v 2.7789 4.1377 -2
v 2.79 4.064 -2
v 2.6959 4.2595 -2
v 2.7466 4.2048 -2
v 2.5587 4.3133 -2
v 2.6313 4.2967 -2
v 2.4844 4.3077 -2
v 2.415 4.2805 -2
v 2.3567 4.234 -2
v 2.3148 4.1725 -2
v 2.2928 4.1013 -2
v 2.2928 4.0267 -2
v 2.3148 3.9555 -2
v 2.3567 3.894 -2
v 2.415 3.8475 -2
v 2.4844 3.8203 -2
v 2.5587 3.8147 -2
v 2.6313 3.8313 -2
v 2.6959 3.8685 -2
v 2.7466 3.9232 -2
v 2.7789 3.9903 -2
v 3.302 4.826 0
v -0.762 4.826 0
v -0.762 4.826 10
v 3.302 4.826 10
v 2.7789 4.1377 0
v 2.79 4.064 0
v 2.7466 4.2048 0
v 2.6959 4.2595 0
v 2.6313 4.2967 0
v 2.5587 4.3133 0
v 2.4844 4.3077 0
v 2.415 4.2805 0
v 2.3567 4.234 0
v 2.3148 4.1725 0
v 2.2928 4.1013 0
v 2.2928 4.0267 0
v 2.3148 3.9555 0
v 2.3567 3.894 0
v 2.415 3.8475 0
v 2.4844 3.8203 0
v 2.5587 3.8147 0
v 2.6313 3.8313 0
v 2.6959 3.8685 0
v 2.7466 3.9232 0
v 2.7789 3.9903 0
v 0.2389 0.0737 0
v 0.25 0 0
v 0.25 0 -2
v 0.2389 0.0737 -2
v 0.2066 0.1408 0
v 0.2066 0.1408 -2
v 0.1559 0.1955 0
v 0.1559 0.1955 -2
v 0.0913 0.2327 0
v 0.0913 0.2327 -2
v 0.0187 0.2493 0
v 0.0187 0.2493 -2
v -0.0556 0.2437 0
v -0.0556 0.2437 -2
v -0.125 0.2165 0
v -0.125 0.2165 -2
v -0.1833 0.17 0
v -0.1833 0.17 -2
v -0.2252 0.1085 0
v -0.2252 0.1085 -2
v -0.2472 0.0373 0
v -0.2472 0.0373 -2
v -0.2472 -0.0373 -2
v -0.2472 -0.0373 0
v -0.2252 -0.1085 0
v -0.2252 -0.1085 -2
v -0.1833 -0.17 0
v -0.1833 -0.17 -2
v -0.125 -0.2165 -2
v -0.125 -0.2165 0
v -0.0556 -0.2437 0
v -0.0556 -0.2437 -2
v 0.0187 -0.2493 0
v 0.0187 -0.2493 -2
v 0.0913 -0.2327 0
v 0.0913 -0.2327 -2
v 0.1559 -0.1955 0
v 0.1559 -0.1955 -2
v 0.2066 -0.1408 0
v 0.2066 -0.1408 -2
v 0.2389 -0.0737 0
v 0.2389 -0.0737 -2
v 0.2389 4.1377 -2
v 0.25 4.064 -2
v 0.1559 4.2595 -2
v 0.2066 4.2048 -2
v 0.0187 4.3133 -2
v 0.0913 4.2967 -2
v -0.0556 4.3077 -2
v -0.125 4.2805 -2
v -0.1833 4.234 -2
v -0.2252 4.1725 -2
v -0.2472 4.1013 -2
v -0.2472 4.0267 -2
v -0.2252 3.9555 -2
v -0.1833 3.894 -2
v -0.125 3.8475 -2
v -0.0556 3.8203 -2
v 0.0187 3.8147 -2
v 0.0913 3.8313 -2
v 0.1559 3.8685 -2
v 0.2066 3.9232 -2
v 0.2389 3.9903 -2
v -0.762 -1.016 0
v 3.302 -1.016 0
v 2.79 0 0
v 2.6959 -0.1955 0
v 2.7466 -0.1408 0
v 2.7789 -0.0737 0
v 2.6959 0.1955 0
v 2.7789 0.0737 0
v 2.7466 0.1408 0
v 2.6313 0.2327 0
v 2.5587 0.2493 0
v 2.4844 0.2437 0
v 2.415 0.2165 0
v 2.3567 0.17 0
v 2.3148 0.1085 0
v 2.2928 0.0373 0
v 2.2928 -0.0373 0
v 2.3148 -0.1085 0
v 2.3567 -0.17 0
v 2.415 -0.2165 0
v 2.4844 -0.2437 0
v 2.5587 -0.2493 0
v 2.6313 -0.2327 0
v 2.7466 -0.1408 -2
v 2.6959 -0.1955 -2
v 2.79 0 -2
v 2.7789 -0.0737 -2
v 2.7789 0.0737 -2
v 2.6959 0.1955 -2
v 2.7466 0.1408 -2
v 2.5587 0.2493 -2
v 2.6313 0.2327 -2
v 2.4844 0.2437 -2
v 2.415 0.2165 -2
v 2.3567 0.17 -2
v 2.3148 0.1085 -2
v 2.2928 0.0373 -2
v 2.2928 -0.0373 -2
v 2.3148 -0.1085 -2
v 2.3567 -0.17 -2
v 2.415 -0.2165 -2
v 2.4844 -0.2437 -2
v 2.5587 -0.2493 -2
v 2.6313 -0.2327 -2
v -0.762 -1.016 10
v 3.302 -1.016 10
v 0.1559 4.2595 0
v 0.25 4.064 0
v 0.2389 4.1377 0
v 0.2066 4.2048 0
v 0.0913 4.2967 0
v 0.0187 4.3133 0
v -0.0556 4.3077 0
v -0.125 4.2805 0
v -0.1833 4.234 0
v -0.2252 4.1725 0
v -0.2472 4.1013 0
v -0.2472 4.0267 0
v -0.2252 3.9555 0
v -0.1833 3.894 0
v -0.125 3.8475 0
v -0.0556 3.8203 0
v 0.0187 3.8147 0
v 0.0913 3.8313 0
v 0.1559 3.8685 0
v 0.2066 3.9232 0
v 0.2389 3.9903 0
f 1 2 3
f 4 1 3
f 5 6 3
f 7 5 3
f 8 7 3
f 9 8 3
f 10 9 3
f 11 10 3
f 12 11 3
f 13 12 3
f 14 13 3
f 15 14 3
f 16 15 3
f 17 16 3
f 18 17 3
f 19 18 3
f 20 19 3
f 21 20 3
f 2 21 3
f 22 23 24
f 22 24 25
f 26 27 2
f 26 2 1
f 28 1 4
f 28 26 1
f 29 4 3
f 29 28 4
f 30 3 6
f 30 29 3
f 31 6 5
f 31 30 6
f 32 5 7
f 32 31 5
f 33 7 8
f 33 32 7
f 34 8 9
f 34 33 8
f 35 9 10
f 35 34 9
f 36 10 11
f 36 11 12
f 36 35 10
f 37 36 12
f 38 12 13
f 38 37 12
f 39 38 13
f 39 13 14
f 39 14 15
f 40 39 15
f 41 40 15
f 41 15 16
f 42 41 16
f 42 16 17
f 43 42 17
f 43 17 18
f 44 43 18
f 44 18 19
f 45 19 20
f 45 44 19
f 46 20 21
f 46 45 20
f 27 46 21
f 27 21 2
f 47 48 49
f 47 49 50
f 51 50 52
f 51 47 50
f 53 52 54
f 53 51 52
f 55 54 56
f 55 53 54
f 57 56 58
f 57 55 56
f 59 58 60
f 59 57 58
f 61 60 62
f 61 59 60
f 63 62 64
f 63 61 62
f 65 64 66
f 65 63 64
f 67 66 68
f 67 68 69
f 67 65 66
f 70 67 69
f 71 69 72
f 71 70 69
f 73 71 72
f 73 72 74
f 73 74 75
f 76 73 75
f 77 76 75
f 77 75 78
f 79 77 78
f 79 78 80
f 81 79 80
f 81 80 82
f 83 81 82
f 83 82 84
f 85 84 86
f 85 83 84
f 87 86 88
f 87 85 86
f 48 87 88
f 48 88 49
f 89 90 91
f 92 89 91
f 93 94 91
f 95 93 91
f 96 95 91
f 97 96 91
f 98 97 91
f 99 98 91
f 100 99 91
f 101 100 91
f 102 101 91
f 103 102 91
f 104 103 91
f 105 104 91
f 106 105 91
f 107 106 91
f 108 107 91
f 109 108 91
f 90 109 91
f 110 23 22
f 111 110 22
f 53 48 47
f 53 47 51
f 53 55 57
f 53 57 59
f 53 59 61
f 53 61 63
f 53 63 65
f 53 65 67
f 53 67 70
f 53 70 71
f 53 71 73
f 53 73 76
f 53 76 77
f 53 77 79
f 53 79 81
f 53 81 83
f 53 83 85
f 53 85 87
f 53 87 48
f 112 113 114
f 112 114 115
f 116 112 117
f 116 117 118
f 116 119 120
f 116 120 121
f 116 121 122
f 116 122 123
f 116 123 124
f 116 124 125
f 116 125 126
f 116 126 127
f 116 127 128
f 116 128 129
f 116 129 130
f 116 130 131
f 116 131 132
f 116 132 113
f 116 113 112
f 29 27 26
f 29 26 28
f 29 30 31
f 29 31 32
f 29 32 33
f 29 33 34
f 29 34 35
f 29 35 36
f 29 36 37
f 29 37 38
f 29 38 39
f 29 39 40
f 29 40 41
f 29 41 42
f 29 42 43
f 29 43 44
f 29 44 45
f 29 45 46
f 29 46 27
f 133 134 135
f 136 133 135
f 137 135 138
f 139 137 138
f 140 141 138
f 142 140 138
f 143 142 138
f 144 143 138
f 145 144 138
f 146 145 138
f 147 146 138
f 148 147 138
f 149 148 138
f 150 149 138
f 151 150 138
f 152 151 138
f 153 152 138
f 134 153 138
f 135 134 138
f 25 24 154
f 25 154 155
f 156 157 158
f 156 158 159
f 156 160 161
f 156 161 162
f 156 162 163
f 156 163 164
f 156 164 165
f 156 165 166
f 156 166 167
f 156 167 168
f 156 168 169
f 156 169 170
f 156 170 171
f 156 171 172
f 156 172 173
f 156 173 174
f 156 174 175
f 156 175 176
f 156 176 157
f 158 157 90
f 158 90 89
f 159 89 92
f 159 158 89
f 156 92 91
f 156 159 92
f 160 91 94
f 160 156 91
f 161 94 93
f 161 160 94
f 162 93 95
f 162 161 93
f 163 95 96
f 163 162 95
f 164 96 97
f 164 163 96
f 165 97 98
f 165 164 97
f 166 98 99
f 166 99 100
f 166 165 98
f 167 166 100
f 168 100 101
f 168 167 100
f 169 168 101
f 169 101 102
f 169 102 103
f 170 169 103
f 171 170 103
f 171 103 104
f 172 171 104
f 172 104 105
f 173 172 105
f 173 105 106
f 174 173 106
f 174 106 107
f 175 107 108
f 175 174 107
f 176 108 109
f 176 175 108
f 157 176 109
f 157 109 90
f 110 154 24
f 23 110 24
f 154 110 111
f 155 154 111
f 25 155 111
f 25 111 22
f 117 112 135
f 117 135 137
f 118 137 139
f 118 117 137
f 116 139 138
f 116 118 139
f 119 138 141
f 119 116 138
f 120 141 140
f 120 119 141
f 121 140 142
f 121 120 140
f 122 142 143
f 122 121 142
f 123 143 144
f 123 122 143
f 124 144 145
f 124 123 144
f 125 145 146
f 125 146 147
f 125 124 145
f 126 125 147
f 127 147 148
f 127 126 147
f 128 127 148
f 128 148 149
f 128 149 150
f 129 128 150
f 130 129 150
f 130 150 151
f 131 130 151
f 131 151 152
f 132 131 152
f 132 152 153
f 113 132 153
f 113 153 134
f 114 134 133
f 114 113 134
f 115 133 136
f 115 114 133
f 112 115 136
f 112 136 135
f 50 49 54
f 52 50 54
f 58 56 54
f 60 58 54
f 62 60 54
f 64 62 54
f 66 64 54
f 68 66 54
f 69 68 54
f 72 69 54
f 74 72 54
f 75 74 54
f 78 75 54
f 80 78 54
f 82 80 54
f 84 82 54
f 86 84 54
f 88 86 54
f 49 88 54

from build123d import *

# Parameters (mm, degrees)
SKETCH1_W               = 4.064
SKETCH1_H               = 5.842
COMPONENT_OUTLINE_DEPTH = 10
SKETCH2_R               = 0.25
EXTRUDE_1_DEPTH         = 2
SKETCH3_R               = 0.25
EXTRUDE_2_DEPTH         = 2
SKETCH4_R               = 0.25
EXTRUDE_3_DEPTH         = 2
SKETCH5_R               = 0.25
EXTRUDE_4_DEPTH         = 2


with BuildPart() as part:
    # Sketch1 → Component_Outline (new body)
    with BuildSketch(Plane.XY):
        with Locations((1.27, 1.905)):
            Rectangle(SKETCH1_W, SKETCH1_H)
    extrude(amount=COMPONENT_OUTLINE_DEPTH)


with BuildPart() as body_2:
    # Sketch2 → Extrude 1 (new body)
    with BuildSketch(Plane.XY):
        with Locations((0, 4.064)):
            Circle(SKETCH2_R)
    extrude(amount=-EXTRUDE_1_DEPTH)


with BuildPart() as body_3:
    # Sketch3 → Extrude 2 (new body)
    with BuildSketch(Plane.XY):
        with Locations((2.54, 4.064)):
            Circle(SKETCH3_R)
    extrude(amount=-EXTRUDE_2_DEPTH)


with BuildPart() as body_4:
    # Sketch4 → Extrude 3 (new body)
    with BuildSketch(Plane.XY):
        with Locations((2.54, 0)):
            Circle(SKETCH4_R)
    extrude(amount=-EXTRUDE_3_DEPTH)


with BuildPart() as body_5:
    # Sketch5 → Extrude 4 (new body)
    with BuildSketch(Plane.XY):
        Circle(SKETCH5_R)
    extrude(amount=-EXTRUDE_4_DEPTH)


solid = Compound([part.part, body_2.part, body_3.part, body_4.part, body_5.part])
